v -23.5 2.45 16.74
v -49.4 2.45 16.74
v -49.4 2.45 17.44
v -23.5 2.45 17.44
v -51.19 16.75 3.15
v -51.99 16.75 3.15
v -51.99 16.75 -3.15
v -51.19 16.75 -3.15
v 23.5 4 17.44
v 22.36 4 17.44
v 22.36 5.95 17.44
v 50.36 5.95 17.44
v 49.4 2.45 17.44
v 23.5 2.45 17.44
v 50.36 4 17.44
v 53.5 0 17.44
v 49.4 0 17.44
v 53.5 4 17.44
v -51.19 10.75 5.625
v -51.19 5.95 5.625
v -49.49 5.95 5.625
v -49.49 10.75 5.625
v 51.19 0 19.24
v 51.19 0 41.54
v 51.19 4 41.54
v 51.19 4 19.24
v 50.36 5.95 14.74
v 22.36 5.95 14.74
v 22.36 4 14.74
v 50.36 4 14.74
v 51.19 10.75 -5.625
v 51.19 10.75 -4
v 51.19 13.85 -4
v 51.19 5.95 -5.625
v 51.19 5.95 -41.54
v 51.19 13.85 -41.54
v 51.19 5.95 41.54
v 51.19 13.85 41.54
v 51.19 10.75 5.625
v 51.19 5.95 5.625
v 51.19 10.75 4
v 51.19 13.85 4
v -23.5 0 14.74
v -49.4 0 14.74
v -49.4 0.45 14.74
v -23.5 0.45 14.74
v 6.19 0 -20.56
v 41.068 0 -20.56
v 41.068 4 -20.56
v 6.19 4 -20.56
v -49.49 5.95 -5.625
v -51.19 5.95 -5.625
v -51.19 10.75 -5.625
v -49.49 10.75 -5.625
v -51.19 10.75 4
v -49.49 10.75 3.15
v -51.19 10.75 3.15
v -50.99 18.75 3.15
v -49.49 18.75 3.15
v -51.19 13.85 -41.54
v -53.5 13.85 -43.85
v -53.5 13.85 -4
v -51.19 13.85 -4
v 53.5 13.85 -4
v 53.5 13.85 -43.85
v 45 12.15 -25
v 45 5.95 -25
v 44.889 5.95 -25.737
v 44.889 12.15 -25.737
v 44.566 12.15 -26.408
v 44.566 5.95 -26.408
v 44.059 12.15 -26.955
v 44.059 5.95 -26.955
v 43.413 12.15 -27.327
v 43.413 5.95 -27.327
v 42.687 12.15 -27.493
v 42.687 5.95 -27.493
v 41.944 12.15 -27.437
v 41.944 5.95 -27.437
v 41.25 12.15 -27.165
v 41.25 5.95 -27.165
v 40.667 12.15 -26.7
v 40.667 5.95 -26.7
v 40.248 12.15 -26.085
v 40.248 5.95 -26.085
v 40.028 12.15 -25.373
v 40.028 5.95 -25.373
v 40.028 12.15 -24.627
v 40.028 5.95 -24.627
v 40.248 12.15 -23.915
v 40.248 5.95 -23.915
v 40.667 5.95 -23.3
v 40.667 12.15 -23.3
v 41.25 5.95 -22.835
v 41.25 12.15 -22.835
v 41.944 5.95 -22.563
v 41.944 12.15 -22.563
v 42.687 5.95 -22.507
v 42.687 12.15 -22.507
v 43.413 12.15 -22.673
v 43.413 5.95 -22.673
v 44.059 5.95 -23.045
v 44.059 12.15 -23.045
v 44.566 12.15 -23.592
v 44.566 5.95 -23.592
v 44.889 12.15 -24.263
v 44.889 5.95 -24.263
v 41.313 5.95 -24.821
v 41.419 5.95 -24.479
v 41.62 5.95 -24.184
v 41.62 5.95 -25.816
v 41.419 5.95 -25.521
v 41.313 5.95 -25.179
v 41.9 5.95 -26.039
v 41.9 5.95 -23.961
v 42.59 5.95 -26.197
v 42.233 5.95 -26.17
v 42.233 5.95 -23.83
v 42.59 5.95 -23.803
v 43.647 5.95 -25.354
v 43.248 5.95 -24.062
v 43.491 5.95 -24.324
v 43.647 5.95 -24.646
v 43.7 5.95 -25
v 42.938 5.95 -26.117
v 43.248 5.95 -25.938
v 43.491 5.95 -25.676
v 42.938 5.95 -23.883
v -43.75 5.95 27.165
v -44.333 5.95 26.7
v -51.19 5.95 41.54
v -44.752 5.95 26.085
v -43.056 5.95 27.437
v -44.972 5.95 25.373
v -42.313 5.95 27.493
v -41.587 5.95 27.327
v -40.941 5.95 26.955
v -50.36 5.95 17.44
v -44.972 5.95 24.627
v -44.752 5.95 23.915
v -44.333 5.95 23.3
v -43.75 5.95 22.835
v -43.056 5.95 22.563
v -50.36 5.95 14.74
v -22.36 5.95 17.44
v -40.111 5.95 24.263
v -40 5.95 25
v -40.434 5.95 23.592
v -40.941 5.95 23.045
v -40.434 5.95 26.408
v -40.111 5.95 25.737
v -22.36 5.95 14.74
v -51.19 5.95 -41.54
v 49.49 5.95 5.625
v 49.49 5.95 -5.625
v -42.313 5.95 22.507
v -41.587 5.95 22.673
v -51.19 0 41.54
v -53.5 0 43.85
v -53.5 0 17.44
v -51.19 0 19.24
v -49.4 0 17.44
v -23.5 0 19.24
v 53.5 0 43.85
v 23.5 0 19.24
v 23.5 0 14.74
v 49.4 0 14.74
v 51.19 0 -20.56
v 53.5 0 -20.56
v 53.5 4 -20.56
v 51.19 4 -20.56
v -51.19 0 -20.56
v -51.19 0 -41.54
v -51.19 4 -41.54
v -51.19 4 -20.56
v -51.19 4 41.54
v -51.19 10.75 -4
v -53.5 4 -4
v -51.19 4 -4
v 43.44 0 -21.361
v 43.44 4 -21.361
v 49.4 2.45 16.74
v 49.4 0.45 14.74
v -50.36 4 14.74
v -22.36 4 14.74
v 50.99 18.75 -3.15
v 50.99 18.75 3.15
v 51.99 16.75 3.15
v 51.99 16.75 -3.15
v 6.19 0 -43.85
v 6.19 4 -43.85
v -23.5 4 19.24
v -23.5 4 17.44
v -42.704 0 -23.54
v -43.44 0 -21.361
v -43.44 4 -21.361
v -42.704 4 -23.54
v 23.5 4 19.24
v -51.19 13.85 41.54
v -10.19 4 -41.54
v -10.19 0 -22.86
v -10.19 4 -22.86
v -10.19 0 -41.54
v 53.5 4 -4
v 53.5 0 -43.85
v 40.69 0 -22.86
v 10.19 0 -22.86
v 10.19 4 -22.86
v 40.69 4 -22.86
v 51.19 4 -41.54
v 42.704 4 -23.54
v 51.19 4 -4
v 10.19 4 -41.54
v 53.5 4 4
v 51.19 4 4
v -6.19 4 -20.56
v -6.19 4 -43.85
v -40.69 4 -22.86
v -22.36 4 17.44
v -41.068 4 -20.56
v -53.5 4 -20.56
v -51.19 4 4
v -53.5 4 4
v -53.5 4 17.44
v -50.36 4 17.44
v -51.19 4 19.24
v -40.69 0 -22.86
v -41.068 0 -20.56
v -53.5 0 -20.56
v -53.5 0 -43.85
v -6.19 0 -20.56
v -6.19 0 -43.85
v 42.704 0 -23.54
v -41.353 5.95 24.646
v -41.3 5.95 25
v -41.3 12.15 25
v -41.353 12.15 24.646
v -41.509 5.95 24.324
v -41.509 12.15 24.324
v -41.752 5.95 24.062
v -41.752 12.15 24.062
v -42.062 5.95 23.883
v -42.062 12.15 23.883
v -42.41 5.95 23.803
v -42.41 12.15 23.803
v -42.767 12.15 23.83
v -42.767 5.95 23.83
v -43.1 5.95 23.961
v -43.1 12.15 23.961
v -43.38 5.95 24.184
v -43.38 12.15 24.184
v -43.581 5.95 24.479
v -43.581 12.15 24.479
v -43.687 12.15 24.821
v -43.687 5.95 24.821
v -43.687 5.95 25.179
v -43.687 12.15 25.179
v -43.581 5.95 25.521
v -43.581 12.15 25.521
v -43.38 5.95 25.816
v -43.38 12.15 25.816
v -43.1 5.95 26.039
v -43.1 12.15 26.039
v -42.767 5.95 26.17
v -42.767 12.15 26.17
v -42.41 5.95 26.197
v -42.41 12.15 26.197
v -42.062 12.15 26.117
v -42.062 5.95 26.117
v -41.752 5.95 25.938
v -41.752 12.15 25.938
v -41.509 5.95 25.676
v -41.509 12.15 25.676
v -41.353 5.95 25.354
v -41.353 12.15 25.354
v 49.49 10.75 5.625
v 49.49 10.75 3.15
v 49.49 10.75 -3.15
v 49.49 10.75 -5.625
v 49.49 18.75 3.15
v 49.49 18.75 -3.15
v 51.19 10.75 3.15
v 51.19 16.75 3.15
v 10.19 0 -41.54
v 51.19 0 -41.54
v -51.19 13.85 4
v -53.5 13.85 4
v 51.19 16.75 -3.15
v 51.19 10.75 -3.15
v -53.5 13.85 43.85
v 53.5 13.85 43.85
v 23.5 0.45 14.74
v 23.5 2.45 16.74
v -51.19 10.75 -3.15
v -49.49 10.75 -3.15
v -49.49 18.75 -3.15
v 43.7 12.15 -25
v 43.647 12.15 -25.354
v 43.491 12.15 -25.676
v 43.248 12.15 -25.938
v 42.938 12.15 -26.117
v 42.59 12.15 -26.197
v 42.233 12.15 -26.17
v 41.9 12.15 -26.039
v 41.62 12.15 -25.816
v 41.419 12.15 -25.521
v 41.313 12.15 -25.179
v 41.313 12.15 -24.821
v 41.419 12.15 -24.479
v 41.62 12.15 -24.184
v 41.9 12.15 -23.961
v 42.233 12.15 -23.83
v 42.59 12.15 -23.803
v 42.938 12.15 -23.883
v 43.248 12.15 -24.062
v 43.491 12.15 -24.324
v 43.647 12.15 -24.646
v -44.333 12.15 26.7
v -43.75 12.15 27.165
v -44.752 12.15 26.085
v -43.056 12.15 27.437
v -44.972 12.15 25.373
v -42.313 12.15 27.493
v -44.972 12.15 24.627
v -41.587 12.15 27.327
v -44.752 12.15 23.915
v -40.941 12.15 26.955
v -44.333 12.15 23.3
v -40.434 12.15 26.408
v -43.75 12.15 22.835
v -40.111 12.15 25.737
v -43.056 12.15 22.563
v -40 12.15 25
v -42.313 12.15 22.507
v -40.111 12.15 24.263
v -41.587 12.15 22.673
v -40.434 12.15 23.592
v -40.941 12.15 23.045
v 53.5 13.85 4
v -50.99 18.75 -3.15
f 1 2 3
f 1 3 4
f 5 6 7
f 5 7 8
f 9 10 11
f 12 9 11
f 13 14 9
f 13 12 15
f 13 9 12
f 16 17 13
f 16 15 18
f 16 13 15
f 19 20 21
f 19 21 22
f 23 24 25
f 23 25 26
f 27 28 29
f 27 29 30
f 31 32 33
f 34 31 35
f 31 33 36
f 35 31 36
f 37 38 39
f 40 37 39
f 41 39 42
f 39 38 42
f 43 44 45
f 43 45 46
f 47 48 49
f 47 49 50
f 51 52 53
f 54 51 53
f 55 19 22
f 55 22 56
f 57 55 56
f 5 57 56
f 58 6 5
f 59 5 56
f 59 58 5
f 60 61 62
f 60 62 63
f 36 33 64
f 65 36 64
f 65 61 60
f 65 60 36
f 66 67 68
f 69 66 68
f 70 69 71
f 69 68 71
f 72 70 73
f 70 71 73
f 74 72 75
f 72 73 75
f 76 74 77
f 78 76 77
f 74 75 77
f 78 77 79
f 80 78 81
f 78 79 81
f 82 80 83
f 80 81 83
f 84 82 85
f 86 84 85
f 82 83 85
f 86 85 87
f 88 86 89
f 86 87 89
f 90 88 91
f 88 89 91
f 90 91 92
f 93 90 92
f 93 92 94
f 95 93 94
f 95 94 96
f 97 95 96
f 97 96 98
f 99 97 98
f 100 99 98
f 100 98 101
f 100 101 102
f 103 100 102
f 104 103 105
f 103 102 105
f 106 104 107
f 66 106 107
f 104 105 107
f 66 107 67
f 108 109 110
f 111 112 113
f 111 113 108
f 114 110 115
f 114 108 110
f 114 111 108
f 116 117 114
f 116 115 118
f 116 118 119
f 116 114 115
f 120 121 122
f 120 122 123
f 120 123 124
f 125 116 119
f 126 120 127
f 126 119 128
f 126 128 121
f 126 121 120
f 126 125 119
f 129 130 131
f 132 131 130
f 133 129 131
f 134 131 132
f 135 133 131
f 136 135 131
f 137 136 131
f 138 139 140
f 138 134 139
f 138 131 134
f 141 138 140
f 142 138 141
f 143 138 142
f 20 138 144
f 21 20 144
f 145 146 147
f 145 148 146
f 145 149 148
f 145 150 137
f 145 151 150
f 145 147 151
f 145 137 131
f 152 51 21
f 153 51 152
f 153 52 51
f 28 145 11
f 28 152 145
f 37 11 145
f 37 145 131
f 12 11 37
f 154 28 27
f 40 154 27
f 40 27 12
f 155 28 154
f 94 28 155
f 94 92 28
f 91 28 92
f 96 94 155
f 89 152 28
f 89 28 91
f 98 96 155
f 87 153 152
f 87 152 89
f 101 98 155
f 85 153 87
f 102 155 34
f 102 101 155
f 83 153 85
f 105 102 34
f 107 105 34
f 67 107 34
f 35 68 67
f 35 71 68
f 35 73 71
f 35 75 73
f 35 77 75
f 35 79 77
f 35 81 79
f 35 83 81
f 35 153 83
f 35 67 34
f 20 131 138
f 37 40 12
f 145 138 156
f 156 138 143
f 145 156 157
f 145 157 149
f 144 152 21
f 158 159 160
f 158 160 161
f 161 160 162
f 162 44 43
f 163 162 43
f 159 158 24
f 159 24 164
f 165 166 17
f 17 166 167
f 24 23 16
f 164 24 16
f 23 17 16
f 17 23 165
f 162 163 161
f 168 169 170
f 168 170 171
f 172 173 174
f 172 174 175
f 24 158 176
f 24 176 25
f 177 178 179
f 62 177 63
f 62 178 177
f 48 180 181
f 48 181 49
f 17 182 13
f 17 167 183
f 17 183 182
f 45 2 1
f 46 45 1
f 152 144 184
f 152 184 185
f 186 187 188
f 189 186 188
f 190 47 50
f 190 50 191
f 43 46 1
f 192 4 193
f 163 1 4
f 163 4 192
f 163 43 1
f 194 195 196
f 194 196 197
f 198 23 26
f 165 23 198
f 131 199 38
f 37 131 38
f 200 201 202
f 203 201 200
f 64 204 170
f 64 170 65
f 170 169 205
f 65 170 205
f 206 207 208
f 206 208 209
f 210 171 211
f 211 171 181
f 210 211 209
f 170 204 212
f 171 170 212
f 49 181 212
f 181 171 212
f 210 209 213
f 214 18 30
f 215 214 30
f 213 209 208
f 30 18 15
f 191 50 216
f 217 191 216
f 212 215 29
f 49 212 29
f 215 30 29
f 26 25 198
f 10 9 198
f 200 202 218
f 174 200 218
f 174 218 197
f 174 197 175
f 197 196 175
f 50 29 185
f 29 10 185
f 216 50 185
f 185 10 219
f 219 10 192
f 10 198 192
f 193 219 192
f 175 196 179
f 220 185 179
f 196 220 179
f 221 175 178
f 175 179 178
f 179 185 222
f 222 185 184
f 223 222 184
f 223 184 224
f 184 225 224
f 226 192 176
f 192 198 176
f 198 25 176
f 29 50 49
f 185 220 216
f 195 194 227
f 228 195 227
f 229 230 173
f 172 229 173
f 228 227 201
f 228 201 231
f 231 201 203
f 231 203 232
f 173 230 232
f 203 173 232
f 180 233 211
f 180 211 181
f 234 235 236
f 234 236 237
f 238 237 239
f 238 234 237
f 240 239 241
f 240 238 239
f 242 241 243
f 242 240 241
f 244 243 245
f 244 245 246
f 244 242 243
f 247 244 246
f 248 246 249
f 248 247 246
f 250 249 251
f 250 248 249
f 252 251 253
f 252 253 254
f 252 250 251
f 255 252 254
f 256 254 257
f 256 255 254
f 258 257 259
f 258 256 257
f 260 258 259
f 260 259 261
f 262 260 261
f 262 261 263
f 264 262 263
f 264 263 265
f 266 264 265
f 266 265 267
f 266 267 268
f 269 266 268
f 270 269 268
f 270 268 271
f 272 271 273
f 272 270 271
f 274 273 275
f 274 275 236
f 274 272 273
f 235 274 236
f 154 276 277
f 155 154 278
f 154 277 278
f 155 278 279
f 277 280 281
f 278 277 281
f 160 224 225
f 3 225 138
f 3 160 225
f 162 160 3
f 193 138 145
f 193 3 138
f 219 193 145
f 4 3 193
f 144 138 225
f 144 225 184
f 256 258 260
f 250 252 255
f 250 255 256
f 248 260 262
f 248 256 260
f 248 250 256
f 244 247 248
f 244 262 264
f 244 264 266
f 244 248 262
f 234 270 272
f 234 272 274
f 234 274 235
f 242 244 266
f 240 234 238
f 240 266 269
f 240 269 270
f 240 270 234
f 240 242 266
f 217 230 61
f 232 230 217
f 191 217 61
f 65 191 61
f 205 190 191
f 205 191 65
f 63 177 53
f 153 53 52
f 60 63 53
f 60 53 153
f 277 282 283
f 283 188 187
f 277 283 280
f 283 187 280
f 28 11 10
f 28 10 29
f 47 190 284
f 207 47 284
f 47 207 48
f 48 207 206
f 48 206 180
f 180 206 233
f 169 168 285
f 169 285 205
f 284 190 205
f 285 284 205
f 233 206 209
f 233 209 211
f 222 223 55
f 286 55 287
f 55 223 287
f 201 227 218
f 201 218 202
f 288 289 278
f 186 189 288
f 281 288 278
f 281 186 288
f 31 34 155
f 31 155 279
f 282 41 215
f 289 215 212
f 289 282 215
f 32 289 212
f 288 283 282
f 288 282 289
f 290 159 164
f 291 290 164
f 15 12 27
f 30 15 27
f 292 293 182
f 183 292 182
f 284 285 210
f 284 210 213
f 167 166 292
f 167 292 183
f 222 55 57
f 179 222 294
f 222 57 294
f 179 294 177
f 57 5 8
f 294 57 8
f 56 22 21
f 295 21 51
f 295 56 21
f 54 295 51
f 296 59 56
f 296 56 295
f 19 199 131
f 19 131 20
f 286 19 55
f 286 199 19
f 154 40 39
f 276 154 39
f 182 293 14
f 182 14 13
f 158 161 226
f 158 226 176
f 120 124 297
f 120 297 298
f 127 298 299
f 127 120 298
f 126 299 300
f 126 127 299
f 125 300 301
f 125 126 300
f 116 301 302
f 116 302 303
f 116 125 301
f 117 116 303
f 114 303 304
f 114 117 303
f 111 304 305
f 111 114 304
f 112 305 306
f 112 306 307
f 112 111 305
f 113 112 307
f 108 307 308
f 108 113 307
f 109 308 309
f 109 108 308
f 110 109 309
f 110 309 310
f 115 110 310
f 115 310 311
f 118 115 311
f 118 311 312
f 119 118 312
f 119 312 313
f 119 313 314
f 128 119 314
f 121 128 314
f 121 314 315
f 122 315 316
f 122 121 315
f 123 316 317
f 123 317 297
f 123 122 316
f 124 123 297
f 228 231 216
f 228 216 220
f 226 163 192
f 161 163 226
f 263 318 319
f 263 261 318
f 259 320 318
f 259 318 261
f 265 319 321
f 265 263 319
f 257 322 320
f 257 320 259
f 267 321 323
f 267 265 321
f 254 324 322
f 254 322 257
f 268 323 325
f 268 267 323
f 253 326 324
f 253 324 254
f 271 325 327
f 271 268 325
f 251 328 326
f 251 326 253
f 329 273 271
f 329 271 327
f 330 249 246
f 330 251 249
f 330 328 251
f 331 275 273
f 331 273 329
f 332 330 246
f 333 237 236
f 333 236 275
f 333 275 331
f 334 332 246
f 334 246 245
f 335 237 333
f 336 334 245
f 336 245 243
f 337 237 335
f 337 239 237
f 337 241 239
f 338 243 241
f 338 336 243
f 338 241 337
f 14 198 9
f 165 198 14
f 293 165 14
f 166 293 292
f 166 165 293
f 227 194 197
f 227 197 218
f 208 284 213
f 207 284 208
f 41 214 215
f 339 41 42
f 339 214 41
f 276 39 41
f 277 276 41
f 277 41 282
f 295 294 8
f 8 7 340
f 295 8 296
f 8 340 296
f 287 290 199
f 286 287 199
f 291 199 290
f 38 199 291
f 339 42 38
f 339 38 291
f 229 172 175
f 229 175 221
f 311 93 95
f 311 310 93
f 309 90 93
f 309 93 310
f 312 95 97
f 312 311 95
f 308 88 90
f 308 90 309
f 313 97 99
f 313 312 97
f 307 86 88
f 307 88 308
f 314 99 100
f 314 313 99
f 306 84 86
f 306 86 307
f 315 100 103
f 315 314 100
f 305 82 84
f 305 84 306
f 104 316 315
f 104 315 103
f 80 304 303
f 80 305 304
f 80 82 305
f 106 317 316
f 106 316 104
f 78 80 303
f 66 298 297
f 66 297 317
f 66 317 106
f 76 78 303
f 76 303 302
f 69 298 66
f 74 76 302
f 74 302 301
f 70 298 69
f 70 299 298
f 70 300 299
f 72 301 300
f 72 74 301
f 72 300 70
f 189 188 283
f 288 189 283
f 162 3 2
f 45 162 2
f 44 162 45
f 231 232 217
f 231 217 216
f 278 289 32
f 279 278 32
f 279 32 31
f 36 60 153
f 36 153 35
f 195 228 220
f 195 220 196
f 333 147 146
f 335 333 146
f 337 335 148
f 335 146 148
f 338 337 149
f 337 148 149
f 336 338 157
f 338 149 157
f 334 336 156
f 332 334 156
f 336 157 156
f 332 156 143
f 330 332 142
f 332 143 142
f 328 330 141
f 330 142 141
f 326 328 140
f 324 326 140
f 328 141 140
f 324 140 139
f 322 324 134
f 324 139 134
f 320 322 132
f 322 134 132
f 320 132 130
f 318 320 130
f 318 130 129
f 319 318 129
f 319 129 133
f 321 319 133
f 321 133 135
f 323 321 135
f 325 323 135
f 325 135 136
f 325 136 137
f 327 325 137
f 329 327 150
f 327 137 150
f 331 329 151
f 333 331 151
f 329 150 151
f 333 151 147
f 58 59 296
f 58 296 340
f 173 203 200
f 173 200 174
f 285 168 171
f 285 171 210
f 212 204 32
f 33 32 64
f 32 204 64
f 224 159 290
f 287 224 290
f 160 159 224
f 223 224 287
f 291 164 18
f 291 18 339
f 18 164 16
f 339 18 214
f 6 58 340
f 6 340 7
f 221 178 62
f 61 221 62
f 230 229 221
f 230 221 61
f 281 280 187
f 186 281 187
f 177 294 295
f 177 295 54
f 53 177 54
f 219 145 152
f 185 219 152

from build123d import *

# Parameters (mm, degrees)
SKETCH1_W           = 107
SKETCH1_H           = 87.7
BOSS_EXTRUDE1_DEPTH = 13.85
SKETCH2_W           = 102.38
SKETCH2_H           = 83.08
CUT_EXTRUDE1_DEPTH  = 7.9
CUT_EXTRUDE2_DEPTH  = 4
SKETCH4_R           = 2.5
SKETCH4_R_2         = 1.2
BOSS_EXTRUDE2_DEPTH = 6.2
SKETCH5_W           = 28
SKETCH5_H           = 2.7
CUT_EXTRUDE3_DEPTH  = 3.5
CHAMFER1_SIZE       = 2
SKETCH6_W           = 8
SKETCH6_H           = 9.85
CUT_EXTRUDE4_DEPTH  = 2.31
SKETCH7_W           = 11.25
SKETCH7_H           = 4.8
BOSS_EXTRUDE3_DEPTH = 1.7
BOSS_EXTRUDE4_DEPTH = 3.15


with BuildPart() as part:
    # Sketch1 → Boss-Extrude1 (new body)
    with BuildSketch(Plane(origin=(0, 0, 0), x_dir=(1, 0, 0), z_dir=(0, 1, 0))):
        Rectangle(SKETCH1_W, SKETCH1_H)
    extrude(amount=BOSS_EXTRUDE1_DEPTH)

    # Sketch2 → Cut-Extrude1 (cut)
    with BuildSketch(Plane(origin=(0, 13.85, 0), x_dir=(1, 0, 0), z_dir=(0, 1, 0))):
        Rectangle(SKETCH2_W, SKETCH2_H)
    extrude(amount=-CUT_EXTRUDE1_DEPTH, mode=Mode.SUBTRACT)

    # Sketch3 → Cut-Extrude2 (cut)
    with BuildSketch(Plane.XZ):
        Polygon((-51.19, 41.54), (51.19, 41.54), (51.19, 19.24), (23.5, 19.24), (23.5, 14.74), (49.4, 14.74), (49.4, 17.44), (53.5, 17.44), (53.5, -20.56), (51.19, -20.56), (51.19, -41.54), (10.19, -41.54), (10.19, -22.86), (40.69, -22.86), (42.704360061, -23.54), (43.44, -21.360818071), (41.067741267, -20.56), (6.19, -20.56), (6.19, -43.85), (-6.19, -43.85), (-6.19, -20.56), (-41.067741267, -20.56), (-43.44, -21.360818071), (-42.704360061, -23.54), (-40.69, -22.86), (-10.19, -22.86), (-10.19, -41.54), (-51.19, -41.54), (-51.19, -20.56), (-53.5, -20.56), (-53.5, 17.44), (-49.4, 17.44), (-49.4, 14.74), (-23.5, 14.74), (-23.5, 19.24), (-51.19, 19.24), align=None)
    extrude(amount=-CUT_EXTRUDE2_DEPTH, mode=Mode.SUBTRACT)

    # Sketch4 → Boss-Extrude2 (add)
    with BuildSketch(Plane(origin=(0, 5.95, 0), x_dir=(1, 0, 0), z_dir=(0, 1, 0))):
        with Locations((-42.5, -25)):
            Circle(SKETCH4_R)
        with Locations((-42.5, -25)):
            Circle(SKETCH4_R_2, mode=Mode.SUBTRACT)
        with Locations((42.5, 25)):
            Circle(SKETCH4_R)
        with Locations((42.5, 25)):
            Circle(SKETCH4_R_2, mode=Mode.SUBTRACT)
    extrude(amount=BOSS_EXTRUDE2_DEPTH)

    # Sketch5 → Cut-Extrude3 (cut)
    with BuildSketch(Plane(origin=(0, 5.95, 0), x_dir=(1, 0, 0), z_dir=(0, 1, 0))):
        with Locations((-36.36, -16.09)):
            Rectangle(SKETCH5_W, SKETCH5_H)
        with Locations((36.36, -16.09)):
            Rectangle(SKETCH5_W, SKETCH5_H)
    extrude(amount=-CUT_EXTRUDE3_DEPTH, mode=Mode.SUBTRACT)

    # Chamfer1
    chamfer1_edges = [part.edges().sort_by_distance(p)[0] for p in [
        (-36.45, 2.45, 14.74),
        (36.45, 2.45, 14.74),
    ]]
    chamfer(chamfer1_edges, length=CHAMFER1_SIZE)

    # Sketch6 → Cut-Extrude4 (cut)
    with BuildSketch(Plane.ZY.offset(53.5)):
        with Locations((0, 8.925)):
            Rectangle(SKETCH6_W, SKETCH6_H)
    cut_extrude4 = extrude(amount=-CUT_EXTRUDE4_DEPTH, mode=Mode.SUBTRACT)

    # Sketch7 → Boss-Extrude3 (add)
    with BuildSketch(Plane(origin=(-51.19, 0, 0), x_dir=(0, 0, -1), z_dir=(1, 0, 0))):
        with Locations((0, 8.35)):
            Rectangle(SKETCH7_W, SKETCH7_H)
    boss_extrude3 = extrude(amount=BOSS_EXTRUDE3_DEPTH)

    # Sketch8 → Boss-Extrude4 (add, symmetric)
    with BuildSketch(Plane.XY):
        Polygon((-49.49, 10.75), (-49.49, 18.75), (-50.99, 18.75), (-51.99, 16.75), (-51.19, 16.75), (-51.19, 10.75), align=None)
    boss_extrude4 = extrude(amount=BOSS_EXTRUDE4_DEPTH, both=True)

    # Mirror1: Cut-Extrude4, Boss-Extrude3, Boss-Extrude4 across plane
    add(cut_extrude4.mirror(Plane(origin=(0, 0, 0), x_dir=(0, 0, 1), z_dir=(1, 0, 0))), mode=Mode.SUBTRACT)
    add(boss_extrude3.mirror(Plane(origin=(0, 0, 0), x_dir=(0, 0, 1), z_dir=(1, 0, 0))))
    add(boss_extrude4.mirror(Plane(origin=(0, 0, 0), x_dir=(0, 0, 1), z_dir=(1, 0, 0))))


solid = part.part
